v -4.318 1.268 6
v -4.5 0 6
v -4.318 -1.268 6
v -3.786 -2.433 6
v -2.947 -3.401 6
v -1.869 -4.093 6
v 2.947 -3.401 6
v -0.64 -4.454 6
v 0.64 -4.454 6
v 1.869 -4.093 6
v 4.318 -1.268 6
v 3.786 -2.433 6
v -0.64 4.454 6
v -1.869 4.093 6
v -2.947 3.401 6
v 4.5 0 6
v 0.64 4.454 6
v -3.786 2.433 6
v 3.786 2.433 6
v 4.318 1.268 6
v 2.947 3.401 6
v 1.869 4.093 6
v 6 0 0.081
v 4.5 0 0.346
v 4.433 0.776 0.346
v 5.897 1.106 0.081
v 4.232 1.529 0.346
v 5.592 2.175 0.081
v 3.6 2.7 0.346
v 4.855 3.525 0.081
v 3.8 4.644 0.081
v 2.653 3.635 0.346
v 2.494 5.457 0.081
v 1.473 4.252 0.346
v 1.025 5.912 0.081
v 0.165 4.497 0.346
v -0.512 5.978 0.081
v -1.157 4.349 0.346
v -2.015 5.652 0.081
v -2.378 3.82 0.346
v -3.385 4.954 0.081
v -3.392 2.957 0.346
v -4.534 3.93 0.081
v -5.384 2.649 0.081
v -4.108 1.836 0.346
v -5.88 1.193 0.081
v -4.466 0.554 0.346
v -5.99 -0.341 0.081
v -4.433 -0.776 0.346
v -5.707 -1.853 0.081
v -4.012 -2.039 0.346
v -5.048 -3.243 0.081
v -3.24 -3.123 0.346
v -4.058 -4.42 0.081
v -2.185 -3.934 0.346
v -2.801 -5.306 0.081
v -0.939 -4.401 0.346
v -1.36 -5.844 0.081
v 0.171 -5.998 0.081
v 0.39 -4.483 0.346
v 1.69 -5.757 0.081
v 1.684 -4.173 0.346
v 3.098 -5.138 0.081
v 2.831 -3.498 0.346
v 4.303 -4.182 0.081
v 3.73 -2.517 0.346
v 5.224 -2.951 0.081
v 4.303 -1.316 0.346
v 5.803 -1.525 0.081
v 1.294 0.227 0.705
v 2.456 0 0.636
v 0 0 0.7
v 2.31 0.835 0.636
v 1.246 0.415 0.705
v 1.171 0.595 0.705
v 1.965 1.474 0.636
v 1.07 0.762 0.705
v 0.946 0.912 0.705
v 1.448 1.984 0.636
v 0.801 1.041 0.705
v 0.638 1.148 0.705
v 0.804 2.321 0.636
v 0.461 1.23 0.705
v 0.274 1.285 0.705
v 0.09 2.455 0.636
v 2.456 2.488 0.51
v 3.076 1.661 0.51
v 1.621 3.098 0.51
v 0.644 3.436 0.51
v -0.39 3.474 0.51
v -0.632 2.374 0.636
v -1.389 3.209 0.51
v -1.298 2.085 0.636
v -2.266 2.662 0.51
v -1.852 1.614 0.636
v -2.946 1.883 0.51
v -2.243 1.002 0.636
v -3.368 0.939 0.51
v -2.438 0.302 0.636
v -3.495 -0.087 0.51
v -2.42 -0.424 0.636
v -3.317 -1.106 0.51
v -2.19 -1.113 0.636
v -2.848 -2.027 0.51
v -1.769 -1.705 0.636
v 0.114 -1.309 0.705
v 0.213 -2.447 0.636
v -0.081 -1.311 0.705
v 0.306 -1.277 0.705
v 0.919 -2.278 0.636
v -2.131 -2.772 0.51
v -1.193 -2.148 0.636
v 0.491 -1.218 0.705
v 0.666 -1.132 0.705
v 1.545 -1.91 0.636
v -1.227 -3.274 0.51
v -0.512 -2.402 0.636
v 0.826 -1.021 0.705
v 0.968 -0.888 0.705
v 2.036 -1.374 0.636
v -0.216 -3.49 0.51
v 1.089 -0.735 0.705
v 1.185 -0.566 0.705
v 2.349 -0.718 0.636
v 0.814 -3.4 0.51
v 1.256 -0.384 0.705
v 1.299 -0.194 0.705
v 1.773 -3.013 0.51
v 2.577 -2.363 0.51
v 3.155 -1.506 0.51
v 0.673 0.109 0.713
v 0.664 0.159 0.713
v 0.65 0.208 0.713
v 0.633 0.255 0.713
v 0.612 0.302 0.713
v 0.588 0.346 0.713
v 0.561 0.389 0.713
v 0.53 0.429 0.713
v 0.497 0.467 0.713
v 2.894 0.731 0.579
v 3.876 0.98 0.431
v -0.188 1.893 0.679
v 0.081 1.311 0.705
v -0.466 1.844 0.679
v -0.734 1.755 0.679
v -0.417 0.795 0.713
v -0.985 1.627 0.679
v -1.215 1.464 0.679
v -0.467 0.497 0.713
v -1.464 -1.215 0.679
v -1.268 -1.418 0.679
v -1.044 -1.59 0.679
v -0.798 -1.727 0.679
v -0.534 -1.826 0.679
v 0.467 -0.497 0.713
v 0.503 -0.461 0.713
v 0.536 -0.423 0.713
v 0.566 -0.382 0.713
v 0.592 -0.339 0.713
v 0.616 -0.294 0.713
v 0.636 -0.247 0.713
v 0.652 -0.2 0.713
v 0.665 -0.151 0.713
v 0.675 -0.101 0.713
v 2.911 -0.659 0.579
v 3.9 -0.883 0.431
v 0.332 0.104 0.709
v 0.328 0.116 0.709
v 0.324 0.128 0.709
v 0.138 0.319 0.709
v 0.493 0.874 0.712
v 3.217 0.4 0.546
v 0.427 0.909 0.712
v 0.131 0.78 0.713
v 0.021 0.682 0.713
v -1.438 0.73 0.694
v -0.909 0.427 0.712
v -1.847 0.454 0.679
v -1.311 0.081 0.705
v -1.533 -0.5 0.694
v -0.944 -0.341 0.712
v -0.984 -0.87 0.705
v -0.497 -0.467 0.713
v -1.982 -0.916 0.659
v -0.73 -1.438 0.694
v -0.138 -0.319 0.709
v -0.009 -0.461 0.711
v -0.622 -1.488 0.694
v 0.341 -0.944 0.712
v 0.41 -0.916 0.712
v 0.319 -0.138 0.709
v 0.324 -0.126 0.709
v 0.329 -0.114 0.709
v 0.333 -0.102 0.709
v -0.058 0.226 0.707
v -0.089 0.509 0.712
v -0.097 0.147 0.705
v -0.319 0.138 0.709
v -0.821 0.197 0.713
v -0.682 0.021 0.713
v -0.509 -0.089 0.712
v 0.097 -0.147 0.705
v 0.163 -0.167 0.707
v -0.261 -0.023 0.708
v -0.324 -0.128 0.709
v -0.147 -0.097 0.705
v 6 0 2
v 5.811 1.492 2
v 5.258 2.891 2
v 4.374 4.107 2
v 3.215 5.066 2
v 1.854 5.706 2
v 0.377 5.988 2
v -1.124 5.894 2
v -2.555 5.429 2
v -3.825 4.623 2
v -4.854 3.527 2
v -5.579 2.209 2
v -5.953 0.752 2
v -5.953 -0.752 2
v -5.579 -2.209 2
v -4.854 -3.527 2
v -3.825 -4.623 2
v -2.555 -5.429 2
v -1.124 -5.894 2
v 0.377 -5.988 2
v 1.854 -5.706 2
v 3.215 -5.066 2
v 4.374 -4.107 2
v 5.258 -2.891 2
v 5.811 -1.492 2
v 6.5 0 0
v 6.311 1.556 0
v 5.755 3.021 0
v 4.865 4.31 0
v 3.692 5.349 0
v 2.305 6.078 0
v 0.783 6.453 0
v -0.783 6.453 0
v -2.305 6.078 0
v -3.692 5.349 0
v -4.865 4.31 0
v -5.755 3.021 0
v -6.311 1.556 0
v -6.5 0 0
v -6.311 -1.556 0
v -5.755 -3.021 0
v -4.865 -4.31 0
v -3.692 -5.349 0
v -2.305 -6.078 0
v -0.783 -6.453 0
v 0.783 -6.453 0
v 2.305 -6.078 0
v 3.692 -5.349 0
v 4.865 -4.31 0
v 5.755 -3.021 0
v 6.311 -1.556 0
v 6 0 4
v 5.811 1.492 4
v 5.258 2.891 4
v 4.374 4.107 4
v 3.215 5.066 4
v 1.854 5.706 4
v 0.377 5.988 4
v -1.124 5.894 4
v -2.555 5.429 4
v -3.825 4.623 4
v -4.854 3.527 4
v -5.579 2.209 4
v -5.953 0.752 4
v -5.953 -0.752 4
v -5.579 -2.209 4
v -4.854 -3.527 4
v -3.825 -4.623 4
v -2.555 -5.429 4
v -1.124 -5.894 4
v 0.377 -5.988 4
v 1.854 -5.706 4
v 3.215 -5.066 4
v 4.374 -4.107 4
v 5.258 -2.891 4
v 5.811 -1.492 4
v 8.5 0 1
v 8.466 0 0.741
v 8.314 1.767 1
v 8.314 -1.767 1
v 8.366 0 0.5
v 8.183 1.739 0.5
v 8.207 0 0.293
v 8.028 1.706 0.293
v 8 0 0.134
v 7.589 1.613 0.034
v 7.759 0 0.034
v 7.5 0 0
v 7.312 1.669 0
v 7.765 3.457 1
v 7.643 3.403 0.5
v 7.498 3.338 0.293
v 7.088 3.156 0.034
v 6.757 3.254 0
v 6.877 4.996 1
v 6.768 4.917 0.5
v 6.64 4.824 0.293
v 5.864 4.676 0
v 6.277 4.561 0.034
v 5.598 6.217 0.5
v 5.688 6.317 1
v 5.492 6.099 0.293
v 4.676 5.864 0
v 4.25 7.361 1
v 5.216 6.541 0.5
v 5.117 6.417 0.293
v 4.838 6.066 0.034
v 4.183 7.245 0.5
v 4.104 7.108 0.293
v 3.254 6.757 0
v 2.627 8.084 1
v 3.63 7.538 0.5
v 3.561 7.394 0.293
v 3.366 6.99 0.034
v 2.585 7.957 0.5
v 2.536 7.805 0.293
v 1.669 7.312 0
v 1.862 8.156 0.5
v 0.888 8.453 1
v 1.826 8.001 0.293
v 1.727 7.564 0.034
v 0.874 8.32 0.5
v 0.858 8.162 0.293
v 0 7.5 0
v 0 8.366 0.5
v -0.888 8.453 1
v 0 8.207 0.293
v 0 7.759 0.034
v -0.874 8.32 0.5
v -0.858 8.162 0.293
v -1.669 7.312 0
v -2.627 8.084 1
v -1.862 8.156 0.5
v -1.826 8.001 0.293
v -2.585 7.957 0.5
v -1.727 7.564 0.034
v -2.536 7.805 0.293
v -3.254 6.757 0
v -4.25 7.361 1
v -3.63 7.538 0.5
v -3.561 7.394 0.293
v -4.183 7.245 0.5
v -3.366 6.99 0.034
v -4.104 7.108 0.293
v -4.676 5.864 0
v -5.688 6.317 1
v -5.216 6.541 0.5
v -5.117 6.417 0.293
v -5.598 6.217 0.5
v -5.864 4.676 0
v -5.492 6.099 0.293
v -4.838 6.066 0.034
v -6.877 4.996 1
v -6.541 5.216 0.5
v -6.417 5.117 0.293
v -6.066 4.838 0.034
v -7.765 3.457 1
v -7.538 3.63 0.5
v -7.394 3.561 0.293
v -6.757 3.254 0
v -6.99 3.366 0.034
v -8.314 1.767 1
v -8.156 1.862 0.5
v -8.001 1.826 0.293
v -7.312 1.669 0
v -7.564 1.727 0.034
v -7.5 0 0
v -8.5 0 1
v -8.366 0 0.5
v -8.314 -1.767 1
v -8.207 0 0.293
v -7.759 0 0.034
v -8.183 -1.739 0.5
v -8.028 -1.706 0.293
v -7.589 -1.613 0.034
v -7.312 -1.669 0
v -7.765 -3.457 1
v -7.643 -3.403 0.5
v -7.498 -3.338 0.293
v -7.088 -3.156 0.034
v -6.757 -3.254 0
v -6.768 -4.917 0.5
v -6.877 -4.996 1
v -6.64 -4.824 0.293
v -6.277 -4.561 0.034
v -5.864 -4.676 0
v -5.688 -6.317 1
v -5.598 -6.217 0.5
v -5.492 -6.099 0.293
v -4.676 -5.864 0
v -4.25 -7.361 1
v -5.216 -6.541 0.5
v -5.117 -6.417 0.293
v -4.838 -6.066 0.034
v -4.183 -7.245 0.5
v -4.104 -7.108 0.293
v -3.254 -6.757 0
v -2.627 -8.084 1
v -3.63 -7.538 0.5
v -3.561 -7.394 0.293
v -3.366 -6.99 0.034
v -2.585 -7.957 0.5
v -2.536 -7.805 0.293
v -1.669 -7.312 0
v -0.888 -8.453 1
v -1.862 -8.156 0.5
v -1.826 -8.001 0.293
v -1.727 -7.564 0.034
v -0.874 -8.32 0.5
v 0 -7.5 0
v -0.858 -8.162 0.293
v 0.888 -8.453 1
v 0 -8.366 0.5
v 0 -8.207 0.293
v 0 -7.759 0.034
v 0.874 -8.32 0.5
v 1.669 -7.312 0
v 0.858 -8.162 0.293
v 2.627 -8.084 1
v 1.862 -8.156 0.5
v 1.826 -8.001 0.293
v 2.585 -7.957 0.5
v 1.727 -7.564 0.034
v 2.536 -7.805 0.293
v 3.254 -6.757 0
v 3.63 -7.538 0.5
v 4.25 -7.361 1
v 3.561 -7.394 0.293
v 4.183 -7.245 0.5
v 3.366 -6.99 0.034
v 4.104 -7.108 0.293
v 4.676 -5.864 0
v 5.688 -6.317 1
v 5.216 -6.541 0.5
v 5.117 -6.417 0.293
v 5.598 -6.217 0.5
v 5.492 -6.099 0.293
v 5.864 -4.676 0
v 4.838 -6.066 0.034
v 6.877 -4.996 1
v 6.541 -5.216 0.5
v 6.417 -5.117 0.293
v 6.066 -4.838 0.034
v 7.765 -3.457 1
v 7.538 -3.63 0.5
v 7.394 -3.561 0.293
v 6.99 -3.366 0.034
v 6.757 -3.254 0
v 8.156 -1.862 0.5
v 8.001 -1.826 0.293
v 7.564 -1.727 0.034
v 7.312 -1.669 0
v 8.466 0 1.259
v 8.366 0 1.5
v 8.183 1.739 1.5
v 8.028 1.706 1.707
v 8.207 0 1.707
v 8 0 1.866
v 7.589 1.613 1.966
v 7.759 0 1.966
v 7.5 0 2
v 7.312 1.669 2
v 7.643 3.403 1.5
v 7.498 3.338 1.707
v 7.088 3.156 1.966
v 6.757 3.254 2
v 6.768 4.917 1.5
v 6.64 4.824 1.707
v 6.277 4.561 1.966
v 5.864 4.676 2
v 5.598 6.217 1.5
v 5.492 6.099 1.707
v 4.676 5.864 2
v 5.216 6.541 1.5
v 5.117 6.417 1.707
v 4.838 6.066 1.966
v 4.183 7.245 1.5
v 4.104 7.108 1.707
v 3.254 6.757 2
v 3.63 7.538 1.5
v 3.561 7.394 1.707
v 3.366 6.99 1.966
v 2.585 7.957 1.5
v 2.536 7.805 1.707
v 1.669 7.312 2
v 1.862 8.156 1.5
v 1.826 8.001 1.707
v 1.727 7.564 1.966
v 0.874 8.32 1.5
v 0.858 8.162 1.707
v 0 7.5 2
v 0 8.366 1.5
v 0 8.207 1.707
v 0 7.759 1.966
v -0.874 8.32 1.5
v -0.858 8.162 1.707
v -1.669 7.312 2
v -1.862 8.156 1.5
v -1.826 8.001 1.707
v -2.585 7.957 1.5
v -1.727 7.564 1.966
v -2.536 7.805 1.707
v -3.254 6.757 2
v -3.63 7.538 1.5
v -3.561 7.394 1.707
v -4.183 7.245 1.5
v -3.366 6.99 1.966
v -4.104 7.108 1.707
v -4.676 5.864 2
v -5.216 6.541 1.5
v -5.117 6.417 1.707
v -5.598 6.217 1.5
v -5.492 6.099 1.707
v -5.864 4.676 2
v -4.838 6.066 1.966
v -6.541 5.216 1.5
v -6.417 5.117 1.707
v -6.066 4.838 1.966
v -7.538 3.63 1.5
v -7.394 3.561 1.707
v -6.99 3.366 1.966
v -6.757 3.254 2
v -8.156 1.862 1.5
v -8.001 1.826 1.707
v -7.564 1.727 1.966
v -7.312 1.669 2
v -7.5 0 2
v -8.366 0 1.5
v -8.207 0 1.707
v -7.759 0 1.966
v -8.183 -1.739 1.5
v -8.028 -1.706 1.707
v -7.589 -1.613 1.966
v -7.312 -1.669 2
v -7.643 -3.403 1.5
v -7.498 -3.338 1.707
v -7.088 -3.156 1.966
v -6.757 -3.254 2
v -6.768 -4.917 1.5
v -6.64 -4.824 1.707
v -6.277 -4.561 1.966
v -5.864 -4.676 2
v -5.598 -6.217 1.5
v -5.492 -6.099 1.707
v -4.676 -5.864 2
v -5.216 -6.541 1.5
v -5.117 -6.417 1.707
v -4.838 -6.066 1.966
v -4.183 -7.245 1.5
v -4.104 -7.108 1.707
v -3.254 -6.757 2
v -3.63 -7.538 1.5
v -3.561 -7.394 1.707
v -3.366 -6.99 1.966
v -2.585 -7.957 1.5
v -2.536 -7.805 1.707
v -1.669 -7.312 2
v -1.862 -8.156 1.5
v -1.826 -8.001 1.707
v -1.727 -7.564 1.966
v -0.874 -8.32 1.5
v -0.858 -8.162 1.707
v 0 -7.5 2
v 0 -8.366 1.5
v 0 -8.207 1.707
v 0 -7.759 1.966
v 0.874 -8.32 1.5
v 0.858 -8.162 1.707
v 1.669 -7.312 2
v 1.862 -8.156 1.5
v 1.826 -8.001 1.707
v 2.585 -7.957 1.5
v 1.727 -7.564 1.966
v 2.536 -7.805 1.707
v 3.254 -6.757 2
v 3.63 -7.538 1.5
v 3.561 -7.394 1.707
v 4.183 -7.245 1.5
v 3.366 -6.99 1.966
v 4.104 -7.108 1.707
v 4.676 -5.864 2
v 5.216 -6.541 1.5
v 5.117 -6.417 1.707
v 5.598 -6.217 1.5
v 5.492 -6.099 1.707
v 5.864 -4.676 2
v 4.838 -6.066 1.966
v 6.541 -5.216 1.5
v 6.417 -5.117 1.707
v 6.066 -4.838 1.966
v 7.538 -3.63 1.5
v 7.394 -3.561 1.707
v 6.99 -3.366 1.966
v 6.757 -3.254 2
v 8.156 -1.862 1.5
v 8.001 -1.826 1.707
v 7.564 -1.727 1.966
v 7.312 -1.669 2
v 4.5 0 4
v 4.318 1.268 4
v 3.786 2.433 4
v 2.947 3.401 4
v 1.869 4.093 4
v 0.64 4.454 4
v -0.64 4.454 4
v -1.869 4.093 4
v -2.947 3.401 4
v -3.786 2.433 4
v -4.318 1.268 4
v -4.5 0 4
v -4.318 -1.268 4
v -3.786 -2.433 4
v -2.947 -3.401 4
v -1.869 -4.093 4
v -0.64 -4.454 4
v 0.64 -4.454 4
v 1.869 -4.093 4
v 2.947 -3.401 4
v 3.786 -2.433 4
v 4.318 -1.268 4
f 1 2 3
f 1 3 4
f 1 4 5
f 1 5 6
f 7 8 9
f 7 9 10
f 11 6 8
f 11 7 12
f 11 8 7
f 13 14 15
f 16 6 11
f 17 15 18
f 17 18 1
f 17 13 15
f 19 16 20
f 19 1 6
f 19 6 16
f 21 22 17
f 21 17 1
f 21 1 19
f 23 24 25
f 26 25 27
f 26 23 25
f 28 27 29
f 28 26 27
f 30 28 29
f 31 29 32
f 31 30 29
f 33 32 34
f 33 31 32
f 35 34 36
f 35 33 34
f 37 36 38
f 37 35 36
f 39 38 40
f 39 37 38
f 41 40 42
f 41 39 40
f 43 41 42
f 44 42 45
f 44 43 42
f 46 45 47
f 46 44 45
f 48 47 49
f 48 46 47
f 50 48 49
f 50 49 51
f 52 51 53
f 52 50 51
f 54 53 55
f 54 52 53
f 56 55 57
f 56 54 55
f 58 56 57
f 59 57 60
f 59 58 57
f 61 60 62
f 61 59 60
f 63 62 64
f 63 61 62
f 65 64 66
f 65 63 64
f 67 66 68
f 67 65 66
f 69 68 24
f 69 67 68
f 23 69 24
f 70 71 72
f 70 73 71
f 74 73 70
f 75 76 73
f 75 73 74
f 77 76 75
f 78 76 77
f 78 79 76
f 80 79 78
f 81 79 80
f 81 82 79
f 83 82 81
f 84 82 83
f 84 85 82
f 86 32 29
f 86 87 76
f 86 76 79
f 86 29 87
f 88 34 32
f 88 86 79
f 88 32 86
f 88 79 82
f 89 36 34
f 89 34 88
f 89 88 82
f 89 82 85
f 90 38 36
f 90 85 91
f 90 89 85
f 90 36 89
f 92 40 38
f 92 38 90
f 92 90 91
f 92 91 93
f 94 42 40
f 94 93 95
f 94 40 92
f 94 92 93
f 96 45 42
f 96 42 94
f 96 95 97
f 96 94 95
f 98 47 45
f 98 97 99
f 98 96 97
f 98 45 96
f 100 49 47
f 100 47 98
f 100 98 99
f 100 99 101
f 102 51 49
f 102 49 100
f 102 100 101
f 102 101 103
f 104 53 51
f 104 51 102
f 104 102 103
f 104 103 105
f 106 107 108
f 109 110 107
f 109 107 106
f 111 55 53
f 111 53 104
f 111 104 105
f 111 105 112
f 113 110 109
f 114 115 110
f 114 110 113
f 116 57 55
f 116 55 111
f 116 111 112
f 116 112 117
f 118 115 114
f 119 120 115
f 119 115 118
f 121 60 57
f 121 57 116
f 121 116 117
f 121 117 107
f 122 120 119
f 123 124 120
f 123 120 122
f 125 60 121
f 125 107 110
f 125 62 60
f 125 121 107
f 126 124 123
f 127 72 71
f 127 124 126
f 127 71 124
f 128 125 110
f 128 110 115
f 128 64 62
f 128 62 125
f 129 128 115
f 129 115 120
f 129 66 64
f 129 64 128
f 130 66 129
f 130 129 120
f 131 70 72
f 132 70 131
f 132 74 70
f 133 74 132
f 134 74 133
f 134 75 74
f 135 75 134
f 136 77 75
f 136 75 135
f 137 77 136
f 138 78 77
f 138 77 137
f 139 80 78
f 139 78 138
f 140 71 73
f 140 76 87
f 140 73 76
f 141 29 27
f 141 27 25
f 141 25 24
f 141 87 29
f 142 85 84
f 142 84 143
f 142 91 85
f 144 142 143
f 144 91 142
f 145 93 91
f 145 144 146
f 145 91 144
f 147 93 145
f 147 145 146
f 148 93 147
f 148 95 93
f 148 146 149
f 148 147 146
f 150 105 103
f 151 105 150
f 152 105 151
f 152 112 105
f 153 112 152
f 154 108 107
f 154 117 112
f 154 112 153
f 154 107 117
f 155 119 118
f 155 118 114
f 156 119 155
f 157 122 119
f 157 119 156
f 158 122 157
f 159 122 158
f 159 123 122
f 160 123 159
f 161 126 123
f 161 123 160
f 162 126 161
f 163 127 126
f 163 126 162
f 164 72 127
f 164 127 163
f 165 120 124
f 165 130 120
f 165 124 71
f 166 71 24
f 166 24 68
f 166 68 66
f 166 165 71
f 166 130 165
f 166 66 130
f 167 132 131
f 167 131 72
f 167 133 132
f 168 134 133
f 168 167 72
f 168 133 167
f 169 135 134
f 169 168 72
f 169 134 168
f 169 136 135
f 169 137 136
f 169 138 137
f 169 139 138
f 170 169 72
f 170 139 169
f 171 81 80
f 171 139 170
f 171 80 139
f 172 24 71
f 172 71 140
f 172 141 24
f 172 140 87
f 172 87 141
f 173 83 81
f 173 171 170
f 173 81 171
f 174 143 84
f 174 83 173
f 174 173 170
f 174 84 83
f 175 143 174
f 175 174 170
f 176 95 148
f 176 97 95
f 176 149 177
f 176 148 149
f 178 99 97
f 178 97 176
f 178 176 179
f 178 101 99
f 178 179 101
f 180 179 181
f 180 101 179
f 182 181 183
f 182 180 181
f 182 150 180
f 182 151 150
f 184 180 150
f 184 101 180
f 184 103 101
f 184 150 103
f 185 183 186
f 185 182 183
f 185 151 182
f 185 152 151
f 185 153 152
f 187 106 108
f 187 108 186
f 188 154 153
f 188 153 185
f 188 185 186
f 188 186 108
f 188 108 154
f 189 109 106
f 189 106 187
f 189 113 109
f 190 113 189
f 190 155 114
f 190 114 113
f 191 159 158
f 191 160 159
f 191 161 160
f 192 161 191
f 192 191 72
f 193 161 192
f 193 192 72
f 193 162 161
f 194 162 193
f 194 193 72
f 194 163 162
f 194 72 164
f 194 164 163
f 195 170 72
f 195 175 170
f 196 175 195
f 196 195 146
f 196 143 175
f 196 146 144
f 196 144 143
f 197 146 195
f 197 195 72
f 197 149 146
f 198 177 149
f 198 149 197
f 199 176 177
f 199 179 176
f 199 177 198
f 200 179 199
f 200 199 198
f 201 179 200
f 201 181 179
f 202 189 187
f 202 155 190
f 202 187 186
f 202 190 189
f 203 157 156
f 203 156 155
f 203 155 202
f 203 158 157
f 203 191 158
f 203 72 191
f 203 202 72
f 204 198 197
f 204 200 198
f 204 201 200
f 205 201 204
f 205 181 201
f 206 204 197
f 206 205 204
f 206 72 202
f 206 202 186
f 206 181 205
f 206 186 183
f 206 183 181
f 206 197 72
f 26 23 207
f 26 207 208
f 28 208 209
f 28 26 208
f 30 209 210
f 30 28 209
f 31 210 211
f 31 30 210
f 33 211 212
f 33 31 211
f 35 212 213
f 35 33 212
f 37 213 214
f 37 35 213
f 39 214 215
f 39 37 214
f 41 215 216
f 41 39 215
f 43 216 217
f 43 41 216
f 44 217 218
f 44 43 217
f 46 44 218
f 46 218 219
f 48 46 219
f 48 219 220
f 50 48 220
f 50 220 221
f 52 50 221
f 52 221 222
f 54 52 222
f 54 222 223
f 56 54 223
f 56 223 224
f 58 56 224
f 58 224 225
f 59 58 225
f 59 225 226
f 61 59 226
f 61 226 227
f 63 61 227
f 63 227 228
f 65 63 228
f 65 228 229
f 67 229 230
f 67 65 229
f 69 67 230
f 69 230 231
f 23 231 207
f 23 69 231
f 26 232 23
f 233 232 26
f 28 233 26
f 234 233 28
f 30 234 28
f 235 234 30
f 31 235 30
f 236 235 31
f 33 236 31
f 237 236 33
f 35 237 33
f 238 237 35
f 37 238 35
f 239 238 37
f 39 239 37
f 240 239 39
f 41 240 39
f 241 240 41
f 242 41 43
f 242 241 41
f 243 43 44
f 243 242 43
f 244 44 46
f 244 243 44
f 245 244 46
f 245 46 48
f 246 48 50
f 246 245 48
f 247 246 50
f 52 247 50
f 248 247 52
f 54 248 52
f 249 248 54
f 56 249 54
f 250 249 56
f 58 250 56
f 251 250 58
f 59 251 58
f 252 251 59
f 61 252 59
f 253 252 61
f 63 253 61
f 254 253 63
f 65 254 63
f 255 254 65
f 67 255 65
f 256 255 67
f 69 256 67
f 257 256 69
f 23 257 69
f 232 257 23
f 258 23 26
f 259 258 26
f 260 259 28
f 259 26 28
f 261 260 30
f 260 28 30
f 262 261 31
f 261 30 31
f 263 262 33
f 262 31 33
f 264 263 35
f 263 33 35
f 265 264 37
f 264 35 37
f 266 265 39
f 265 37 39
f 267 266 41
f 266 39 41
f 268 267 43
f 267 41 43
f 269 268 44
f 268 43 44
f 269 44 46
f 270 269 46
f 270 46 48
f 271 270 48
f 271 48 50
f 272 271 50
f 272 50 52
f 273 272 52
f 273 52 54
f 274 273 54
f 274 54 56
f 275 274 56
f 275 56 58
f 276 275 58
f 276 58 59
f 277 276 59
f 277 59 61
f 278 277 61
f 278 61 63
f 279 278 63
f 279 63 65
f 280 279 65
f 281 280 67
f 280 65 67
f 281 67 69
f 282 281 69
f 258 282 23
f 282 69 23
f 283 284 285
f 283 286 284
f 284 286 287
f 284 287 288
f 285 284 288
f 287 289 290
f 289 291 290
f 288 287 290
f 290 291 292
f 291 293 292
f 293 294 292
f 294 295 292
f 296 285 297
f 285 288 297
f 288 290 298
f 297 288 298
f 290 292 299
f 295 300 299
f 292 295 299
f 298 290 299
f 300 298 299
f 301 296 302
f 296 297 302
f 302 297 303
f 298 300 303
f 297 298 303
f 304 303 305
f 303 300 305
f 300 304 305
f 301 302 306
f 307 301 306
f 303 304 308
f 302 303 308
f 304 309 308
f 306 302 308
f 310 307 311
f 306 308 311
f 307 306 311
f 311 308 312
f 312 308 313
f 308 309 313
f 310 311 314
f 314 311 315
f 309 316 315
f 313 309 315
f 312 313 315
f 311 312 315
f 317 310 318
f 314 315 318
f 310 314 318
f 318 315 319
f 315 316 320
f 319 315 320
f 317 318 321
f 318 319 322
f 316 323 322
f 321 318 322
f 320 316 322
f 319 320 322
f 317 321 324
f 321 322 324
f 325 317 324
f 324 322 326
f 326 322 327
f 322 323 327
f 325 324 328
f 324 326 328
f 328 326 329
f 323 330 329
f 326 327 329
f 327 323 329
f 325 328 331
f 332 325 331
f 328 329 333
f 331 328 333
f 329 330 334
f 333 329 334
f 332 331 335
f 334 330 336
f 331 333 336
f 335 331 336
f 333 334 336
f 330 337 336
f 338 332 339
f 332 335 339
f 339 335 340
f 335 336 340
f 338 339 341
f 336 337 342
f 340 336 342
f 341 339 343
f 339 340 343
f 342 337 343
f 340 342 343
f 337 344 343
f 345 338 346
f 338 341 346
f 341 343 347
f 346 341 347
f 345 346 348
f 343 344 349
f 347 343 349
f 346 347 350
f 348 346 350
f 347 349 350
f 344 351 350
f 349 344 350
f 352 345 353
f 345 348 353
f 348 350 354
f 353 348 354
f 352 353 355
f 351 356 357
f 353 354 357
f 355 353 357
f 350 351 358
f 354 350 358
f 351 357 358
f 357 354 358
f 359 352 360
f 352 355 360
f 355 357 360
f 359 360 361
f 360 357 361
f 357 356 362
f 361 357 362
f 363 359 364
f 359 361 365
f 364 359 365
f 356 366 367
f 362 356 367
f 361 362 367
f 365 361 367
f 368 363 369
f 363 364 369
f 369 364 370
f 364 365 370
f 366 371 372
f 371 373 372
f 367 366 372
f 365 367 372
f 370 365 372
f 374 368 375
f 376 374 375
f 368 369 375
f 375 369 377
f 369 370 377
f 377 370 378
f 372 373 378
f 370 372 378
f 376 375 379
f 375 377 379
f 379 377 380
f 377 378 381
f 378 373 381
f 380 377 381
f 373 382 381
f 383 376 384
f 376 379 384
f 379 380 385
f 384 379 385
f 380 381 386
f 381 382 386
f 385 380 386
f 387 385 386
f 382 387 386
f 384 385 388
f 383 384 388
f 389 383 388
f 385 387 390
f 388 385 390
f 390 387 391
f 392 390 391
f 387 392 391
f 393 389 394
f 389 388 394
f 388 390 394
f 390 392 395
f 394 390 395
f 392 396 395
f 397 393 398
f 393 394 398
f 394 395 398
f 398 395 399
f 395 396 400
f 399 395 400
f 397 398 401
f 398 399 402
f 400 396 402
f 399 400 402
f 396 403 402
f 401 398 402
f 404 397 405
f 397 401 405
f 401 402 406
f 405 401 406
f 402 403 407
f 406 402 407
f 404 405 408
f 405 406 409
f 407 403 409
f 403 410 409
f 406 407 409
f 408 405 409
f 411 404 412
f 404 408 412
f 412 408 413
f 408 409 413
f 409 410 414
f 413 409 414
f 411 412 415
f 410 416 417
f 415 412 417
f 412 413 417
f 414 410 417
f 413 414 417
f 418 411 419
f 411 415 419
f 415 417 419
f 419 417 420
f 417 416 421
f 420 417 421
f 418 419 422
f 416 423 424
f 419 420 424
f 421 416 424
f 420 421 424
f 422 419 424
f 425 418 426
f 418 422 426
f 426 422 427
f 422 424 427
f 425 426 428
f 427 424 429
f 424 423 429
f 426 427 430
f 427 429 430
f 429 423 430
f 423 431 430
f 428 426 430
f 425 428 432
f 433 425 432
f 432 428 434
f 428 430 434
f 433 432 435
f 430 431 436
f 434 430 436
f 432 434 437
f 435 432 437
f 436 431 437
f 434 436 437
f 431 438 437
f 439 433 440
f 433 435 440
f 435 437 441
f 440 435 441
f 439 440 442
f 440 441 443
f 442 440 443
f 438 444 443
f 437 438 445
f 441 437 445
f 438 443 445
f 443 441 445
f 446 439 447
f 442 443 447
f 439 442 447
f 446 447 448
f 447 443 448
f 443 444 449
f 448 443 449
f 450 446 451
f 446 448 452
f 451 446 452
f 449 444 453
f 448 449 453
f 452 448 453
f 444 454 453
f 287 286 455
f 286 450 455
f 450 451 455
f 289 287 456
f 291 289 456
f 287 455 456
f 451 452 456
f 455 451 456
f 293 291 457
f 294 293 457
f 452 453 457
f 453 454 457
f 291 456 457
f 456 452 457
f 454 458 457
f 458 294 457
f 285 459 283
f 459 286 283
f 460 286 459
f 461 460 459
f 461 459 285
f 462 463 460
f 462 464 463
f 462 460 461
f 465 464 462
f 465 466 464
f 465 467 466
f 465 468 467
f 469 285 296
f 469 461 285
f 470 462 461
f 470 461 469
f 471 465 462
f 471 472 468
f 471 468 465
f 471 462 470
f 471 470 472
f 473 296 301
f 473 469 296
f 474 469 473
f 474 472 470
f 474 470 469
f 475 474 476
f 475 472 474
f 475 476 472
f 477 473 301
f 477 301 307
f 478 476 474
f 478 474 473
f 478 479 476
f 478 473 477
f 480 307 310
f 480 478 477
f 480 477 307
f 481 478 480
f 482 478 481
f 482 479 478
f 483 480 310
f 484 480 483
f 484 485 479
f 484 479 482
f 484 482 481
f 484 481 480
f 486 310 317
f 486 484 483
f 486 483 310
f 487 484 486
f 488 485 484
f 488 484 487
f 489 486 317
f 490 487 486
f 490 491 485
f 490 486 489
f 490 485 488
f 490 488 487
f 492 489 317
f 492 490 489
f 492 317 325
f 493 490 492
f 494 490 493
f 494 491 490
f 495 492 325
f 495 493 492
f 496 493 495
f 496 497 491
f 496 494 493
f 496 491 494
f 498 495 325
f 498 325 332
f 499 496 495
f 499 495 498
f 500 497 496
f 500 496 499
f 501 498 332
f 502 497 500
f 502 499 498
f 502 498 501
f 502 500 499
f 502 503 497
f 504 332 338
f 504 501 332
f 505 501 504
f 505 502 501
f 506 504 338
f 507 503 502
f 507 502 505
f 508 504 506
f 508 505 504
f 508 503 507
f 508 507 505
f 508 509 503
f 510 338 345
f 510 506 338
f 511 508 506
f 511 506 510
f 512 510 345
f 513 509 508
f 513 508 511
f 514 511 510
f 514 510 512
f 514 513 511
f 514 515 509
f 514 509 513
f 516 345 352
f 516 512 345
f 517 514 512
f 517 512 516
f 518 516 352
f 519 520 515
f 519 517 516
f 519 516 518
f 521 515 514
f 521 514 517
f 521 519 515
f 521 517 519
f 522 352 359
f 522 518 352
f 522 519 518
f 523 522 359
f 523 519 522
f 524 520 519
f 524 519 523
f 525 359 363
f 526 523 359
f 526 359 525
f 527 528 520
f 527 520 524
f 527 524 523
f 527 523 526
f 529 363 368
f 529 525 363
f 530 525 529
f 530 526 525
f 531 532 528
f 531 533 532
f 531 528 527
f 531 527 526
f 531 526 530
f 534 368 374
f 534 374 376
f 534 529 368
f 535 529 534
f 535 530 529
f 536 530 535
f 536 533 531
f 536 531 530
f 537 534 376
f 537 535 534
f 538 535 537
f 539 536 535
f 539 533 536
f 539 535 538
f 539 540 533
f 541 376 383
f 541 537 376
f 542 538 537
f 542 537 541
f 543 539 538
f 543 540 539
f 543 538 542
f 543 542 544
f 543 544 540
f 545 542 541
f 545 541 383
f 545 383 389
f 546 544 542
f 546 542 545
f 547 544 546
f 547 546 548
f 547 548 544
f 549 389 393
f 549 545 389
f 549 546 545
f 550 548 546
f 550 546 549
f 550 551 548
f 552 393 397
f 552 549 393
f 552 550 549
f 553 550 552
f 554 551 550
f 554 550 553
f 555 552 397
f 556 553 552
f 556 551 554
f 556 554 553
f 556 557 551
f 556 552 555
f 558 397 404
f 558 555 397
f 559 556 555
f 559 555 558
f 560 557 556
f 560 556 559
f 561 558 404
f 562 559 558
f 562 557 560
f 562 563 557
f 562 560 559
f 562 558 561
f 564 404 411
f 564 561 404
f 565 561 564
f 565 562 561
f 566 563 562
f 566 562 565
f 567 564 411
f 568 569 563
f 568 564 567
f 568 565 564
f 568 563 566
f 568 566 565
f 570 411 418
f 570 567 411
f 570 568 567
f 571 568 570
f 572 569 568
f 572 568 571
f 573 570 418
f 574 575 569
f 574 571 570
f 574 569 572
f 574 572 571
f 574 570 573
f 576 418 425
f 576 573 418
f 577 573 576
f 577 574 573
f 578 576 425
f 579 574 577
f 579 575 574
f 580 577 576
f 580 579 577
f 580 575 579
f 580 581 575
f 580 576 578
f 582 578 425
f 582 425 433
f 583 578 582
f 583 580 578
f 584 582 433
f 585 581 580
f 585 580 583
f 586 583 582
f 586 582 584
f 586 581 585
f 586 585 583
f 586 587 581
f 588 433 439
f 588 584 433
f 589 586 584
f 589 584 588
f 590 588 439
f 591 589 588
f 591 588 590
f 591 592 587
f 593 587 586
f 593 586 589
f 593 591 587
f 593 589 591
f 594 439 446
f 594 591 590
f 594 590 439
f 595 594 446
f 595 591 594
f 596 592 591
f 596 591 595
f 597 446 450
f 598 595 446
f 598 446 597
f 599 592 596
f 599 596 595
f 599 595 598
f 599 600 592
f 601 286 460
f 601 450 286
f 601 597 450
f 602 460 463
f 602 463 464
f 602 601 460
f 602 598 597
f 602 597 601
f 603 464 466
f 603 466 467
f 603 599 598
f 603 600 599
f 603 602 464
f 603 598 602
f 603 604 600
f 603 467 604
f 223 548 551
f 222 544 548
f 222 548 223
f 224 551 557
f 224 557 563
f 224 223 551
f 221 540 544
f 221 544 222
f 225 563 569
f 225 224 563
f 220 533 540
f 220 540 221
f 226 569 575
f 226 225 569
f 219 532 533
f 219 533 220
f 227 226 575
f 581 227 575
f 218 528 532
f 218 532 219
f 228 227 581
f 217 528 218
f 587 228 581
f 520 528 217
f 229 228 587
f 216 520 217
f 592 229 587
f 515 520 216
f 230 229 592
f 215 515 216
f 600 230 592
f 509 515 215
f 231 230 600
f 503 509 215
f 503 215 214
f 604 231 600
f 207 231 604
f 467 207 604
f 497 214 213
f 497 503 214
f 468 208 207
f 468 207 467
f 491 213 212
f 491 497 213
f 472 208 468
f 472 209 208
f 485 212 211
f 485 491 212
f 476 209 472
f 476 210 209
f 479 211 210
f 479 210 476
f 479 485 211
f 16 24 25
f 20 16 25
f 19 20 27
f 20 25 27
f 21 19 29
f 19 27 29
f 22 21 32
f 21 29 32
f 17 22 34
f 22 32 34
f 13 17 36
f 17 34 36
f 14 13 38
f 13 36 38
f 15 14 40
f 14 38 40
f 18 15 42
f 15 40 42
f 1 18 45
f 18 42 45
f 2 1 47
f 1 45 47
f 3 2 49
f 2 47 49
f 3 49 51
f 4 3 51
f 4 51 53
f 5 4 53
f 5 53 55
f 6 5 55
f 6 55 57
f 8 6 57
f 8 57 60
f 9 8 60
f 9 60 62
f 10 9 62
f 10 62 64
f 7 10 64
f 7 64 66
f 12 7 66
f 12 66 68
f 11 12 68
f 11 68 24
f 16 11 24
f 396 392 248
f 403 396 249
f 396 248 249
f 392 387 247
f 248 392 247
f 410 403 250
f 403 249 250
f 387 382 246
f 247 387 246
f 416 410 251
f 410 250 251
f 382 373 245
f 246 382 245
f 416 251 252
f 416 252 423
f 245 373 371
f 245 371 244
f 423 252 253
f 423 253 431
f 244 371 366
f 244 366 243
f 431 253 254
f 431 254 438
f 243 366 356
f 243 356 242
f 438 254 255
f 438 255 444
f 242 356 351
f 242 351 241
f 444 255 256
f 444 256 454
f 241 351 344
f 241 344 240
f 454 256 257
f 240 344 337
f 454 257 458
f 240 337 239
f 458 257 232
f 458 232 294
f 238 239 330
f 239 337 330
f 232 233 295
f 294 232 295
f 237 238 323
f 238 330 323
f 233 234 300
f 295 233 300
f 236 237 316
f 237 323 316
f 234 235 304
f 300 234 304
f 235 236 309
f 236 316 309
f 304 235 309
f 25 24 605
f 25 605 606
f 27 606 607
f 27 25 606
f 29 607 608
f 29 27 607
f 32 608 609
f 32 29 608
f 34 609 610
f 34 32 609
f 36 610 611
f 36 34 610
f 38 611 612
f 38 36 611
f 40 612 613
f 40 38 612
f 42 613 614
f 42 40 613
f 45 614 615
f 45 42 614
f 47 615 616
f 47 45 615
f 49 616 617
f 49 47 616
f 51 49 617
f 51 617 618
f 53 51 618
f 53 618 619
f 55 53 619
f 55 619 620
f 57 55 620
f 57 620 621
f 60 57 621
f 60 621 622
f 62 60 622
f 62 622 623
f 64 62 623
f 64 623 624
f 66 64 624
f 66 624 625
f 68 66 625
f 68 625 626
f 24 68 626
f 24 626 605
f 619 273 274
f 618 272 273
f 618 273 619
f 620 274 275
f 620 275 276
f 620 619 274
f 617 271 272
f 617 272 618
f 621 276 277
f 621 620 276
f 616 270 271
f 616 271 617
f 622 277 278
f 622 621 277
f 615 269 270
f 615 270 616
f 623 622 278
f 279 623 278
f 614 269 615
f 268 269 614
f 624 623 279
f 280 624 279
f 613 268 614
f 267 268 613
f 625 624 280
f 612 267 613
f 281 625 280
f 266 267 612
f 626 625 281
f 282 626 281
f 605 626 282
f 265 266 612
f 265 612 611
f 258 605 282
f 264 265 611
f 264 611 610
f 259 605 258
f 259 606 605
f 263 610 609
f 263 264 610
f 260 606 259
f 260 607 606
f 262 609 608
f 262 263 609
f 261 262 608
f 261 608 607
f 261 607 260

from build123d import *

# Parameters (mm, degrees)
F0_R     = 4.5
F1_DEPTH = 6
F0_R_2   = 6
F2_DEPTH = 4
F0_R_3   = 8.5
F3_DEPTH = 2
F4_R     = 0.99999


# Not quite as in the source:
# - a fillet or chamfer is up to 0.001 mm smaller than in the source, because OpenCascade refuses the exact size


with BuildPart() as f1:
    # F0 (on Top) → F1 (new body)
    with BuildSketch(Plane.XY):
        Circle(F0_R)
    extrude(amount=F1_DEPTH)


with BuildPart() as f2:
    # F0 (on Top) → F2 (new body)
    with BuildSketch(Plane.XY):
        Circle(F0_R_2)
        Circle(F0_R, mode=Mode.SUBTRACT)
    extrude(amount=F2_DEPTH)


with BuildPart() as f3:
    # F0 (on Top) → F3 (new body)
    with BuildSketch(Plane.XY):
        Circle(F0_R_3)
        Circle(F0_R_2, mode=Mode.SUBTRACT)
    extrude(amount=F3_DEPTH)

    # F4 (radius 1 in the source; OpenCascade refuses exactly that, so slightly less here)
    f4_edges = [f3.edges().sort_by_distance(p)[0] for p in [
        (-8.5, 0, 0),
        (-8.5, 0, 2),
    ]]
    fillet(f4_edges, radius=F4_R)


with BuildPart() as f6_tool:
    # F5 (on Front) → F6 (revolve)
    with BuildSketch(Plane.XZ):
        with BuildLine():
            Line((0, 0.7), (0, 0))
            Line((0, 0), (6.5, 0))
            add(Edge.make_bspline(
                [(0, 0.7), (2.7754448838, 0.7950184902), (4.1902936064, 0.3592014255), (6.5, 0)],
                knots=[0, 0, 0, 0, 6.5375836515, 6.5375836515, 6.5375836515, 6.5375836515], degree=3))
        make_face()
    revolve(axis=Axis((0, 0, 0.35), (0, 0, 1)))


with BuildPart() as f1_1:
    add(f1.part)

    # F6: cut by f6_tool
    add(f6_tool.part, mode=Mode.SUBTRACT)


with BuildPart() as f2_1:
    add(f2.part)

    # F6: cut by f6_tool
    add(f6_tool.part, mode=Mode.SUBTRACT)


with BuildPart() as f3_1:
    add(f3.part)

    # F6: cut by f6_tool
    add(f6_tool.part, mode=Mode.SUBTRACT)


solid = Compound([f1_1.part, f2_1.part, f3_1.part])
